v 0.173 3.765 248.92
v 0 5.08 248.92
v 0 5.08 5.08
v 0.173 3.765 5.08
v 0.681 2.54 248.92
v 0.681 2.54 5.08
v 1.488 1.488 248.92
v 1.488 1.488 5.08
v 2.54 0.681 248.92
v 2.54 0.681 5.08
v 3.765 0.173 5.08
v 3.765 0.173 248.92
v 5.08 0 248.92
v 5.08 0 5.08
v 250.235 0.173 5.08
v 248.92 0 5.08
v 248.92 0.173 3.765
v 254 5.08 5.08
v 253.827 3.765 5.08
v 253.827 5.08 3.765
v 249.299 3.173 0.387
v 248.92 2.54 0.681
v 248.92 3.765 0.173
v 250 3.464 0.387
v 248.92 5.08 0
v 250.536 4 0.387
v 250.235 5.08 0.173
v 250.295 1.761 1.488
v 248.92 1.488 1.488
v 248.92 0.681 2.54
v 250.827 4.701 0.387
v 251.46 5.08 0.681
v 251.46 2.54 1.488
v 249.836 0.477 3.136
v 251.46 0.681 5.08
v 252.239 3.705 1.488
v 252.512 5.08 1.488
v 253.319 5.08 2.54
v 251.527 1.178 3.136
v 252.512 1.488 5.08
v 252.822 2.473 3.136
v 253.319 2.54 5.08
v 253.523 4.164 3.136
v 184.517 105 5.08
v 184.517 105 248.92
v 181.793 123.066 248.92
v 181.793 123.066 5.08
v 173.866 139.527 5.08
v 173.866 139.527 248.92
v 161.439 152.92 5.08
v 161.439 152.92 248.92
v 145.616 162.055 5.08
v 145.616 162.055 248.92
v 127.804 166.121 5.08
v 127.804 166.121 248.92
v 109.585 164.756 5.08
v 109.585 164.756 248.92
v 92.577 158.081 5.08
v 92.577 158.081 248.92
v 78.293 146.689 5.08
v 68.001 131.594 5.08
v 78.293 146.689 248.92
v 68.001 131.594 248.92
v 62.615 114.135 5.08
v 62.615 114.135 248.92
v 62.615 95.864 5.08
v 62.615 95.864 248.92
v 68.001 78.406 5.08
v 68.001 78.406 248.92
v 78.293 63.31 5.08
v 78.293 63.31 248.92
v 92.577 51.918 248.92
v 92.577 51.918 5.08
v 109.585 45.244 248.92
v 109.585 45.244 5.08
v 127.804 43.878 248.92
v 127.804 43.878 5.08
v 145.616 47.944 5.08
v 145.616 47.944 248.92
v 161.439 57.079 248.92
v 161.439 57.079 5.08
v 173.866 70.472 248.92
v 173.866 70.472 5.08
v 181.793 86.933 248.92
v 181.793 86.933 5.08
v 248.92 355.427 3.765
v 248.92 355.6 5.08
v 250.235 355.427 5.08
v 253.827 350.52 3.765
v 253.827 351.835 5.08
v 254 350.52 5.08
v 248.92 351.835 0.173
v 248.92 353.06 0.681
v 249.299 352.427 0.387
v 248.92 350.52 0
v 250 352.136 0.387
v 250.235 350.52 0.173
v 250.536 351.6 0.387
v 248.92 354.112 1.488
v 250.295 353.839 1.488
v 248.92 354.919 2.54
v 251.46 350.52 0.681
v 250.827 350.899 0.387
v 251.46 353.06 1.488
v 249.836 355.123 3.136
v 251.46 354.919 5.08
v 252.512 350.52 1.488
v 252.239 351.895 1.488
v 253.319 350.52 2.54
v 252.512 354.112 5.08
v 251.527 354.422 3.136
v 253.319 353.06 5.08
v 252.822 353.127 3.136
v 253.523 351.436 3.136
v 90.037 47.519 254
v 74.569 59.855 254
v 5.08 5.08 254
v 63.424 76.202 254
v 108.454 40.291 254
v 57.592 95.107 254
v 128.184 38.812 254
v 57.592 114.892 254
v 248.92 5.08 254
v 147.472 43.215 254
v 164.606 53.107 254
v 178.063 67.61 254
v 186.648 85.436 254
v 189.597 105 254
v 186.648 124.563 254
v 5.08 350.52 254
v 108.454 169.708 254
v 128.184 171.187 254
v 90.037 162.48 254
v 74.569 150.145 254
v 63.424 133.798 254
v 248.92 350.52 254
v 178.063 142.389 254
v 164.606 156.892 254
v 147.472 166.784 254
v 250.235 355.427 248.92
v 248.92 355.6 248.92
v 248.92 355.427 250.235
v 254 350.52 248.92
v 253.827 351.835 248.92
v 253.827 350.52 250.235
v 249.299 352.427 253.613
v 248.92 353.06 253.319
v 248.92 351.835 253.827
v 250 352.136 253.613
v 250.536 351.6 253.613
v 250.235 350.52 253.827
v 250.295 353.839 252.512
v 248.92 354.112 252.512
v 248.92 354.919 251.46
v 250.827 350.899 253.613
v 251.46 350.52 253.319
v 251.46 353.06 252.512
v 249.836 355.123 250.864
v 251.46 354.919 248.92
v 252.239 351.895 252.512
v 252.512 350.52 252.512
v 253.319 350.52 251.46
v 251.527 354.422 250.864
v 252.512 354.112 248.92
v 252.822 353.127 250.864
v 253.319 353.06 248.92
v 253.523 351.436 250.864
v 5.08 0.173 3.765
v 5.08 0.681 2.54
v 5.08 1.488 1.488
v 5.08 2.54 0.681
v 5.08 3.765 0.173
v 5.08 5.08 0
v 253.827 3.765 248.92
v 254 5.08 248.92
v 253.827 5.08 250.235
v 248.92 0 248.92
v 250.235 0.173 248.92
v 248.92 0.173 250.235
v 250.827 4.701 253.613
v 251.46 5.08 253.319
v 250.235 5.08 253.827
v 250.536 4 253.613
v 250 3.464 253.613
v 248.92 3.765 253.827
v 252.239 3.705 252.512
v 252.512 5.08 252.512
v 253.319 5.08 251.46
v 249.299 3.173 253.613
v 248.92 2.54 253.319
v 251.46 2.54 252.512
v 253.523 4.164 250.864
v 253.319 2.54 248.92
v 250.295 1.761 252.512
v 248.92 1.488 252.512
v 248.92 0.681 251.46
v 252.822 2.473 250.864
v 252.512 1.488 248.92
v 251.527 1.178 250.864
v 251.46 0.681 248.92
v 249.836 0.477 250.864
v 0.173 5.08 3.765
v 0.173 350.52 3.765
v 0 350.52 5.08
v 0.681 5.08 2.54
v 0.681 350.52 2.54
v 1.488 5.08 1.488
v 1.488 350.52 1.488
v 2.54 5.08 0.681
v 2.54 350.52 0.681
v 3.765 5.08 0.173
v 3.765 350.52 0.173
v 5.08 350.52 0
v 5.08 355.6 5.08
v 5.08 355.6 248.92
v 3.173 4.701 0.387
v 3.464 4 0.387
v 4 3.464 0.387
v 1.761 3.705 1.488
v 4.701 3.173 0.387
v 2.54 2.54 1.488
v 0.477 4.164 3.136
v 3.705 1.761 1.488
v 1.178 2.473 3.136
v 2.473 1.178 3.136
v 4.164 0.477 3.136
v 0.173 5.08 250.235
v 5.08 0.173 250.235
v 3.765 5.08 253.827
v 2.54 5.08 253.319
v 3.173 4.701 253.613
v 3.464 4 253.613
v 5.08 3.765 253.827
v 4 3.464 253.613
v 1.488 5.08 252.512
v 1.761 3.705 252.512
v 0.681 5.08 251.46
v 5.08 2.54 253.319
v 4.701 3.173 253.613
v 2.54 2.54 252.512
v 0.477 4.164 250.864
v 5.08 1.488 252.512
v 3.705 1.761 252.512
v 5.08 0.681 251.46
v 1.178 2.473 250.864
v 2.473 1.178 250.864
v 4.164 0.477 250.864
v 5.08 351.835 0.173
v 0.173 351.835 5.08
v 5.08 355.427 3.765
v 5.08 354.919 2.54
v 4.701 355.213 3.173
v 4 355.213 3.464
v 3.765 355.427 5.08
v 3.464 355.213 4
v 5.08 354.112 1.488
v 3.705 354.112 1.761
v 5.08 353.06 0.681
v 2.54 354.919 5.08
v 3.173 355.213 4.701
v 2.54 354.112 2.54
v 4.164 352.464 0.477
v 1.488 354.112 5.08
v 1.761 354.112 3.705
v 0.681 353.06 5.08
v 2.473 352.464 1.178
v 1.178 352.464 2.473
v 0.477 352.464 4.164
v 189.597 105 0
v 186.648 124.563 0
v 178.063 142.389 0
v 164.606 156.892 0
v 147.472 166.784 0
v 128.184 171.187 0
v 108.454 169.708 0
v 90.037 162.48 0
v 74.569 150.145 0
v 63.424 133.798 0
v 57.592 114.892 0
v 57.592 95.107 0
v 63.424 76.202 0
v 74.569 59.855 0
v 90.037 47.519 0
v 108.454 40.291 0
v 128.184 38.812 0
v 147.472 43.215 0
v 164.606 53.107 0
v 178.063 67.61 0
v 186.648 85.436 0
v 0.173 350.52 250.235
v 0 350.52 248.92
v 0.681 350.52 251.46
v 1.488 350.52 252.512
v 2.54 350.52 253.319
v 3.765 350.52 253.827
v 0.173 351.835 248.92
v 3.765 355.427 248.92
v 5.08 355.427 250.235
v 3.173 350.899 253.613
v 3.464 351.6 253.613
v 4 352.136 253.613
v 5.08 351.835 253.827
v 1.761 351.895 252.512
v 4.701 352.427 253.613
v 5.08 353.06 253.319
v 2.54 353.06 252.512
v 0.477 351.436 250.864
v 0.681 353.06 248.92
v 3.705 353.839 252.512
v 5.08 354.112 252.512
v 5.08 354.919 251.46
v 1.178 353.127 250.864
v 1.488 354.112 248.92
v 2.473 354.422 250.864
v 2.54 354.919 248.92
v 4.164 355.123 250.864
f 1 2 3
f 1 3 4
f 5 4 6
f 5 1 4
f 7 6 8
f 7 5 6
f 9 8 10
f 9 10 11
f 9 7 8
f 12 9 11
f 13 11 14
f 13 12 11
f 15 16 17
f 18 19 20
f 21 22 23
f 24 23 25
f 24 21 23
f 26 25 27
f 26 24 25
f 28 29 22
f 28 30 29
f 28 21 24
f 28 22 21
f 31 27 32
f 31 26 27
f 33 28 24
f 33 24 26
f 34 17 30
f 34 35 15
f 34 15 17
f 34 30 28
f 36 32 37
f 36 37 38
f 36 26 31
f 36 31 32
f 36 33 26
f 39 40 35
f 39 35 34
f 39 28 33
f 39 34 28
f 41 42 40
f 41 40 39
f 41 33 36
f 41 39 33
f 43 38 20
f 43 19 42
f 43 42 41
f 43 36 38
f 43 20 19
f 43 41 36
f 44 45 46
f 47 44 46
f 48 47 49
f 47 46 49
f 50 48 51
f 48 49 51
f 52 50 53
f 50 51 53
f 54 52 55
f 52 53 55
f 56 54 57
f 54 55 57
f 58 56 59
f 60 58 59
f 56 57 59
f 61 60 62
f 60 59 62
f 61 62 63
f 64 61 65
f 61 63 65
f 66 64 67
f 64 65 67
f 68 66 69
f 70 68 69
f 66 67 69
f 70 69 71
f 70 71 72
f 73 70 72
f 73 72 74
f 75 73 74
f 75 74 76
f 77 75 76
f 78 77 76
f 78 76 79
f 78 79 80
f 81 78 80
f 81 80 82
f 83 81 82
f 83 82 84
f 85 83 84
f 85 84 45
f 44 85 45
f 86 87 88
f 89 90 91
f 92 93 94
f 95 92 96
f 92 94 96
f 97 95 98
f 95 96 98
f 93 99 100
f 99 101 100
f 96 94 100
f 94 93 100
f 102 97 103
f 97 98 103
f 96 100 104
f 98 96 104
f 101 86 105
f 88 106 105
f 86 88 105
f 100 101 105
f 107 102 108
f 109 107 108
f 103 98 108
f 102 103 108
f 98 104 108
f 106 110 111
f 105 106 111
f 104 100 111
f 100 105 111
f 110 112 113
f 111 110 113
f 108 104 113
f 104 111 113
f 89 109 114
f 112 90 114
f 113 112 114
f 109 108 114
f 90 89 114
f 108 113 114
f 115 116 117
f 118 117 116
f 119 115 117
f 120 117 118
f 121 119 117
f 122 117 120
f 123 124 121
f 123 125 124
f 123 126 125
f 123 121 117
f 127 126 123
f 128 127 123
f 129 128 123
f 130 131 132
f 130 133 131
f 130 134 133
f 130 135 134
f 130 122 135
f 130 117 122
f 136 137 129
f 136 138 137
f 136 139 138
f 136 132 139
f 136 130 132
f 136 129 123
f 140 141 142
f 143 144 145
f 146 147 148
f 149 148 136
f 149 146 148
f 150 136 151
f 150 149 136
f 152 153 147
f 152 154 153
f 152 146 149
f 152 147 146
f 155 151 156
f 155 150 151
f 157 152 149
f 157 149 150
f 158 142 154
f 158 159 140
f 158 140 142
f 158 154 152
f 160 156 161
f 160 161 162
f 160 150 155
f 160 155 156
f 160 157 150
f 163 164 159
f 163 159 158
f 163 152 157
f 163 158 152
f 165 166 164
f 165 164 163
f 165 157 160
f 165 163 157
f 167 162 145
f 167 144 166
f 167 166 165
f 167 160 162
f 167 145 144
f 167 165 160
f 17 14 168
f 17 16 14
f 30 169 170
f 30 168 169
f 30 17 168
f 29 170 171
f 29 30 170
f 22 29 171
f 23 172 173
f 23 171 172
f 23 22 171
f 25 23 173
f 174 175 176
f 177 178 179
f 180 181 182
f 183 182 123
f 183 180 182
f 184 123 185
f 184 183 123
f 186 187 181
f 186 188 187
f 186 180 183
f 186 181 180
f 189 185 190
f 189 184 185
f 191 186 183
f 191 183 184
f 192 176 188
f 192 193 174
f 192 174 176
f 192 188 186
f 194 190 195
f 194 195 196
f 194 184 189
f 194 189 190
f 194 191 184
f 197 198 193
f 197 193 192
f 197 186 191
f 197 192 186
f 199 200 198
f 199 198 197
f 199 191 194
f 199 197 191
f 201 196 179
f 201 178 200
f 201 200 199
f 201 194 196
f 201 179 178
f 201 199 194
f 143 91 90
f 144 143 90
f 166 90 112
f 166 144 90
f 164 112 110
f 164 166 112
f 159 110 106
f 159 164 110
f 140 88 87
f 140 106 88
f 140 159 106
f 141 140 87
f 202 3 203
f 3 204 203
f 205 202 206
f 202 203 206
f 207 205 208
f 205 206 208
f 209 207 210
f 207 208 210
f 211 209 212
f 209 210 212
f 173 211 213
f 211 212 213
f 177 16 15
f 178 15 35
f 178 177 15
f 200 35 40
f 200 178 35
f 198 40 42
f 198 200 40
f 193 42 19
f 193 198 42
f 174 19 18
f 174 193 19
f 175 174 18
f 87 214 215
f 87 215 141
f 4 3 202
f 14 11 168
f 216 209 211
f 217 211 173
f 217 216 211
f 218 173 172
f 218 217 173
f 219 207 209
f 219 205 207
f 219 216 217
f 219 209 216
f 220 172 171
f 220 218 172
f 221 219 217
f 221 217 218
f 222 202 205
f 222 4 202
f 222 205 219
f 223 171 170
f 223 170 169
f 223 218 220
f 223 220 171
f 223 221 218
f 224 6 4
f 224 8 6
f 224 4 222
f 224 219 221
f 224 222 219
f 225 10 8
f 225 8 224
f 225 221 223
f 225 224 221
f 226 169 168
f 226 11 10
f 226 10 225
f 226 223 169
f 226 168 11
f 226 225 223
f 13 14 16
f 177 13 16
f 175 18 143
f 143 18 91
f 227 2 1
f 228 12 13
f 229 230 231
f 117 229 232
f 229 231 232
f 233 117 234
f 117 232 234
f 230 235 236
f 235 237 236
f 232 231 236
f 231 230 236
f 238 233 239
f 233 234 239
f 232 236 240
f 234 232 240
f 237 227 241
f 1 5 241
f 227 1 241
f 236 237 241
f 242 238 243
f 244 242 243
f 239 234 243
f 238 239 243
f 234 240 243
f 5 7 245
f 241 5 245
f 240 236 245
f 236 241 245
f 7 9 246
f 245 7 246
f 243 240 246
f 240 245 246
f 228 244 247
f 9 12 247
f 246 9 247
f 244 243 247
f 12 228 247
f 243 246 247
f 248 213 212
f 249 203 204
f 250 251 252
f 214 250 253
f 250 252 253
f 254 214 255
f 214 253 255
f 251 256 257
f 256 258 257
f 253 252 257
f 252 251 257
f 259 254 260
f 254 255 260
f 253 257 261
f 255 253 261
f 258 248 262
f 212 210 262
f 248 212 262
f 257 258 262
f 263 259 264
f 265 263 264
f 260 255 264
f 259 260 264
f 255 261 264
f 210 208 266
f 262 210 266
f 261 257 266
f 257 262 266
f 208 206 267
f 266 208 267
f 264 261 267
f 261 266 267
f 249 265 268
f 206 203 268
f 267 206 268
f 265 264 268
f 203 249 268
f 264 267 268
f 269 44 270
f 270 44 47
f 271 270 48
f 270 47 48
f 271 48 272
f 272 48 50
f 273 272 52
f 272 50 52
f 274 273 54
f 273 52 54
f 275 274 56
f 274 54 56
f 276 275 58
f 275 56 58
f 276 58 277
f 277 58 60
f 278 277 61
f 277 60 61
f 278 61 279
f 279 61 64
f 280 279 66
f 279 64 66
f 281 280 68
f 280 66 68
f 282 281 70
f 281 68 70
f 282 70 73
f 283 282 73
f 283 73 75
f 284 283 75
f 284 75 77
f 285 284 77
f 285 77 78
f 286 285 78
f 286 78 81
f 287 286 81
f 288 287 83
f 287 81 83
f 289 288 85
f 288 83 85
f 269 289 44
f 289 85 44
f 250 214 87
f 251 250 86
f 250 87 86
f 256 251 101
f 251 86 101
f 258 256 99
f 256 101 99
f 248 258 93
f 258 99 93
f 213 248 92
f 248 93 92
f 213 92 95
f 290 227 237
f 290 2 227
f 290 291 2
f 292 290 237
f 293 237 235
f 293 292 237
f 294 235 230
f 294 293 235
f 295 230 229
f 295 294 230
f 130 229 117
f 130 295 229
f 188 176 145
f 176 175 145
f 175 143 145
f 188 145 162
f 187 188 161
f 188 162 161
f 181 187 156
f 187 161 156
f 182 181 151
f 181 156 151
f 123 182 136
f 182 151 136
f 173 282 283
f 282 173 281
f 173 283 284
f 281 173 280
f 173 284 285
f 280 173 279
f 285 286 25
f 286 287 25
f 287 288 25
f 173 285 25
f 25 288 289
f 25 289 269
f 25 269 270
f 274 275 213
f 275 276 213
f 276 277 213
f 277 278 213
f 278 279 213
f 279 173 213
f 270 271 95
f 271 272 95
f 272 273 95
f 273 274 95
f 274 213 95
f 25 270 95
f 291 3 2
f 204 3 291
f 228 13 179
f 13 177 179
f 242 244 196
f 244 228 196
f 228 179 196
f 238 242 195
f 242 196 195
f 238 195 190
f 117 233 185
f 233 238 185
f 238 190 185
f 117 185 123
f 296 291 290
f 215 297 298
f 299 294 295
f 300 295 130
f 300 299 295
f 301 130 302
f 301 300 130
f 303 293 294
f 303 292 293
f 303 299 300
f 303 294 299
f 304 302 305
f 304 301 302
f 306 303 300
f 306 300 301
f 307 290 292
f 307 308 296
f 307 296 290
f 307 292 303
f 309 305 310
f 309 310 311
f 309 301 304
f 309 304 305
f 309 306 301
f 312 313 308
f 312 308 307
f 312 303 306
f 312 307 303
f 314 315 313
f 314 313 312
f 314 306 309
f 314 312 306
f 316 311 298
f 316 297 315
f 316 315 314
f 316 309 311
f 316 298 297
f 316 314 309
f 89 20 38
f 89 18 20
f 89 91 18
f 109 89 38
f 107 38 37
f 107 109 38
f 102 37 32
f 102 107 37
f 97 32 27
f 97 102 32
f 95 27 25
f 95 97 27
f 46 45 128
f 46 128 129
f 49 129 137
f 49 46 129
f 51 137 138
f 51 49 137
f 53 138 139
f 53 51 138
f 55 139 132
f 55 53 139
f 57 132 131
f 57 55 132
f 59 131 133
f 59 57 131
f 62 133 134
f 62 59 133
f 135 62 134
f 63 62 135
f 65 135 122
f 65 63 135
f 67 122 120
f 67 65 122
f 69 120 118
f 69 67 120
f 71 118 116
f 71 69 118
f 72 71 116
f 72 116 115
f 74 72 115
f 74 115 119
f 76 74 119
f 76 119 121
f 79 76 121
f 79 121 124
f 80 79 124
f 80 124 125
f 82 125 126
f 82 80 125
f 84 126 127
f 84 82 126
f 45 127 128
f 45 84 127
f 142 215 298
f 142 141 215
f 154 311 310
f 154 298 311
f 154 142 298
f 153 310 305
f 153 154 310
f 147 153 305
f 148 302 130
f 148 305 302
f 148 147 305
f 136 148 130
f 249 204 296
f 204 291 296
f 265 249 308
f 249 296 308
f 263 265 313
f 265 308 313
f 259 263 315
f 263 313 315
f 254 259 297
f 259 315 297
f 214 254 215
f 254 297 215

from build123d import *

# Parameters (mm, degrees)
F0_W     = 254
F0_H     = 355.6
F1_DEPTH = 254
F2_R     = 5.08
F3_R     = 61.292809
F4_DEPTH = 254.001
F5_SIZE  = 5.08


with BuildPart() as f1:
    # F0 (on Top) → F1 (new body)
    with BuildSketch(Plane.XY):
        with Locations((127, 177.8)):
            Rectangle(F0_W, F0_H)
    extrude(amount=F1_DEPTH)

    # F2
    f2_edges = [f1.edges().sort_by_distance(p)[0] for p in [
        (254, 0, 127),
        (254, 355.6, 127),
        (0, 0, 127),
        (0, 177.8, 0),
        (127, 355.6, 0),
        (127, 0, 0),
        (254, 177.8, 0),
        (0, 355.6, 127),
        (0, 177.8, 254),
        (127, 355.6, 254),
        (254, 177.8, 254),
        (127, 0, 254),
    ]]
    fillet(f2_edges, radius=F2_R)

    # F3 (on face) → F4 (cut, through all)
    with BuildSketch(Plane.XY.offset(254)):
        with Locations((123.2237, 104.999602)):
            Circle(F3_R)
    extrude(amount=-F4_DEPTH, mode=Mode.SUBTRACT)

    # F5
    f5_edges = [f1.edges().sort_by_distance(p)[0] for p in [
        (61.930891, 104.999602, 254),
        (61.930891, 104.999602, 0),
    ]]
    chamfer(f5_edges, length=F5_SIZE)


solid = f1.part
